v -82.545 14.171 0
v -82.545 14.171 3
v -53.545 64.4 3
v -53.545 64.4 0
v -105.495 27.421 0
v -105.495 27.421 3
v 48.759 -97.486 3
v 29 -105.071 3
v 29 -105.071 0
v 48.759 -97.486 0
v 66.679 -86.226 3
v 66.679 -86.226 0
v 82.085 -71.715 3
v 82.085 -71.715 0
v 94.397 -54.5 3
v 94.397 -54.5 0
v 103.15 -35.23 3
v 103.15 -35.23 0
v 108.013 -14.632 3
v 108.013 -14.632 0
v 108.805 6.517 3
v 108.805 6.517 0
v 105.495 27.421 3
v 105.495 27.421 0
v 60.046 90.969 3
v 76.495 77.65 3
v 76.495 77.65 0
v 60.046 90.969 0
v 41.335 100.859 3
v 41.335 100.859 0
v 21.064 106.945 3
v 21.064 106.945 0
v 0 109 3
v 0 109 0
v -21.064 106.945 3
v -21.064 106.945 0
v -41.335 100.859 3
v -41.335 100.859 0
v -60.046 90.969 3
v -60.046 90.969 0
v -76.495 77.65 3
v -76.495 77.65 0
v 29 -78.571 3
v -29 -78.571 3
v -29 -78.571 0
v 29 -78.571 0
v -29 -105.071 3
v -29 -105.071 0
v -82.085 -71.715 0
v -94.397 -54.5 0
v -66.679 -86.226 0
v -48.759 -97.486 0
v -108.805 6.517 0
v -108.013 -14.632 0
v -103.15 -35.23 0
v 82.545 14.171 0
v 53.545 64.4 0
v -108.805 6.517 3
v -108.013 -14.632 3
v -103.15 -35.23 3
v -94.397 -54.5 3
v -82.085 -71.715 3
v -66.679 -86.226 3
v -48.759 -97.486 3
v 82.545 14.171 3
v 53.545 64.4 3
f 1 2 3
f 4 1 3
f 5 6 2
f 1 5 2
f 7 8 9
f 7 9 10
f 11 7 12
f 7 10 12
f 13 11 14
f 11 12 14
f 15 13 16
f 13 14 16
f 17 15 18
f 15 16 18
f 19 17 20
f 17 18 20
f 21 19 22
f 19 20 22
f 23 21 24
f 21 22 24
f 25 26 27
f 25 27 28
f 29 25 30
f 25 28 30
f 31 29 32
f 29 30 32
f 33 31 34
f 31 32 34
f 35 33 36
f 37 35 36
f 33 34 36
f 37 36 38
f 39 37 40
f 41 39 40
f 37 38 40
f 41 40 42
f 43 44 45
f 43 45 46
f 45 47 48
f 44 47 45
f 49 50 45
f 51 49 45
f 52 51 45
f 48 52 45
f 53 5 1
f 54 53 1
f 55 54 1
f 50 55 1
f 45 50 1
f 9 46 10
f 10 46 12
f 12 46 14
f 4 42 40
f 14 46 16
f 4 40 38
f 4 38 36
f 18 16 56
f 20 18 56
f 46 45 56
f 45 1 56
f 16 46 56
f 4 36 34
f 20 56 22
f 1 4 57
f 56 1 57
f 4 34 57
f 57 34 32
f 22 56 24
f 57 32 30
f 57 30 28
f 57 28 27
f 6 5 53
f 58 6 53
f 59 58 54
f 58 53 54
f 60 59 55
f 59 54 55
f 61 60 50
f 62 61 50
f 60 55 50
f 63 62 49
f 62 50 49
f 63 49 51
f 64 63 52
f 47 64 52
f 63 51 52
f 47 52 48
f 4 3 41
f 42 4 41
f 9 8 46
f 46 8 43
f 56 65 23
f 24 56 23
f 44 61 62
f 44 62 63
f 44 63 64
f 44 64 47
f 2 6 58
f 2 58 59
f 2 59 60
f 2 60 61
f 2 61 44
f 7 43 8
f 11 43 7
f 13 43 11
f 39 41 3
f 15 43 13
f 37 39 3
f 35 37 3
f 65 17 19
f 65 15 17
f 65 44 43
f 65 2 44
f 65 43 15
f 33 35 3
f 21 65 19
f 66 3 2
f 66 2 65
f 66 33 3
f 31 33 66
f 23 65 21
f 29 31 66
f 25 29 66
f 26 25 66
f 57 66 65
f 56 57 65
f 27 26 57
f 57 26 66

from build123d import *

# Parameters (mm, degrees)
ESQUISSE2_R             = 109
BOSS_EXTRU_1_DEPTH      = 3
ESQUISSE3_W             = 58
ESQUISSE3_H             = 42.41769301
ENL_V_MAT_EXTRU_1_DEPTH = 3


with BuildPart() as part:
    # Esquisse2 → Boss.-Extru.1 (new body)
    with BuildSketch(Plane.XY):
        Circle(ESQUISSE2_R)
    extrude(amount=BOSS_EXTRU_1_DEPTH)

    # Esquisse3 → Enlèv. mat.-Extru.1 (cut)
    with BuildSketch(Plane.XY.offset(3)):
        with Locations((0, -99.780250798)):
            Rectangle(ESQUISSE3_W, ESQUISSE3_H)
        Polygon((-90.279631846, 85.609285361), (-119.279631846, 35.379811942), (-82.544832128, 14.170965437), (-53.544832128, 64.400438856), align=None)
        Polygon((119.279631846, 35.379811942), (90.279631846, 85.609285361), (53.544832128, 64.400438856), (82.544832128, 14.170965437), align=None)
    extrude(amount=-ENL_V_MAT_EXTRU_1_DEPTH, mode=Mode.SUBTRACT)


solid = part.part
